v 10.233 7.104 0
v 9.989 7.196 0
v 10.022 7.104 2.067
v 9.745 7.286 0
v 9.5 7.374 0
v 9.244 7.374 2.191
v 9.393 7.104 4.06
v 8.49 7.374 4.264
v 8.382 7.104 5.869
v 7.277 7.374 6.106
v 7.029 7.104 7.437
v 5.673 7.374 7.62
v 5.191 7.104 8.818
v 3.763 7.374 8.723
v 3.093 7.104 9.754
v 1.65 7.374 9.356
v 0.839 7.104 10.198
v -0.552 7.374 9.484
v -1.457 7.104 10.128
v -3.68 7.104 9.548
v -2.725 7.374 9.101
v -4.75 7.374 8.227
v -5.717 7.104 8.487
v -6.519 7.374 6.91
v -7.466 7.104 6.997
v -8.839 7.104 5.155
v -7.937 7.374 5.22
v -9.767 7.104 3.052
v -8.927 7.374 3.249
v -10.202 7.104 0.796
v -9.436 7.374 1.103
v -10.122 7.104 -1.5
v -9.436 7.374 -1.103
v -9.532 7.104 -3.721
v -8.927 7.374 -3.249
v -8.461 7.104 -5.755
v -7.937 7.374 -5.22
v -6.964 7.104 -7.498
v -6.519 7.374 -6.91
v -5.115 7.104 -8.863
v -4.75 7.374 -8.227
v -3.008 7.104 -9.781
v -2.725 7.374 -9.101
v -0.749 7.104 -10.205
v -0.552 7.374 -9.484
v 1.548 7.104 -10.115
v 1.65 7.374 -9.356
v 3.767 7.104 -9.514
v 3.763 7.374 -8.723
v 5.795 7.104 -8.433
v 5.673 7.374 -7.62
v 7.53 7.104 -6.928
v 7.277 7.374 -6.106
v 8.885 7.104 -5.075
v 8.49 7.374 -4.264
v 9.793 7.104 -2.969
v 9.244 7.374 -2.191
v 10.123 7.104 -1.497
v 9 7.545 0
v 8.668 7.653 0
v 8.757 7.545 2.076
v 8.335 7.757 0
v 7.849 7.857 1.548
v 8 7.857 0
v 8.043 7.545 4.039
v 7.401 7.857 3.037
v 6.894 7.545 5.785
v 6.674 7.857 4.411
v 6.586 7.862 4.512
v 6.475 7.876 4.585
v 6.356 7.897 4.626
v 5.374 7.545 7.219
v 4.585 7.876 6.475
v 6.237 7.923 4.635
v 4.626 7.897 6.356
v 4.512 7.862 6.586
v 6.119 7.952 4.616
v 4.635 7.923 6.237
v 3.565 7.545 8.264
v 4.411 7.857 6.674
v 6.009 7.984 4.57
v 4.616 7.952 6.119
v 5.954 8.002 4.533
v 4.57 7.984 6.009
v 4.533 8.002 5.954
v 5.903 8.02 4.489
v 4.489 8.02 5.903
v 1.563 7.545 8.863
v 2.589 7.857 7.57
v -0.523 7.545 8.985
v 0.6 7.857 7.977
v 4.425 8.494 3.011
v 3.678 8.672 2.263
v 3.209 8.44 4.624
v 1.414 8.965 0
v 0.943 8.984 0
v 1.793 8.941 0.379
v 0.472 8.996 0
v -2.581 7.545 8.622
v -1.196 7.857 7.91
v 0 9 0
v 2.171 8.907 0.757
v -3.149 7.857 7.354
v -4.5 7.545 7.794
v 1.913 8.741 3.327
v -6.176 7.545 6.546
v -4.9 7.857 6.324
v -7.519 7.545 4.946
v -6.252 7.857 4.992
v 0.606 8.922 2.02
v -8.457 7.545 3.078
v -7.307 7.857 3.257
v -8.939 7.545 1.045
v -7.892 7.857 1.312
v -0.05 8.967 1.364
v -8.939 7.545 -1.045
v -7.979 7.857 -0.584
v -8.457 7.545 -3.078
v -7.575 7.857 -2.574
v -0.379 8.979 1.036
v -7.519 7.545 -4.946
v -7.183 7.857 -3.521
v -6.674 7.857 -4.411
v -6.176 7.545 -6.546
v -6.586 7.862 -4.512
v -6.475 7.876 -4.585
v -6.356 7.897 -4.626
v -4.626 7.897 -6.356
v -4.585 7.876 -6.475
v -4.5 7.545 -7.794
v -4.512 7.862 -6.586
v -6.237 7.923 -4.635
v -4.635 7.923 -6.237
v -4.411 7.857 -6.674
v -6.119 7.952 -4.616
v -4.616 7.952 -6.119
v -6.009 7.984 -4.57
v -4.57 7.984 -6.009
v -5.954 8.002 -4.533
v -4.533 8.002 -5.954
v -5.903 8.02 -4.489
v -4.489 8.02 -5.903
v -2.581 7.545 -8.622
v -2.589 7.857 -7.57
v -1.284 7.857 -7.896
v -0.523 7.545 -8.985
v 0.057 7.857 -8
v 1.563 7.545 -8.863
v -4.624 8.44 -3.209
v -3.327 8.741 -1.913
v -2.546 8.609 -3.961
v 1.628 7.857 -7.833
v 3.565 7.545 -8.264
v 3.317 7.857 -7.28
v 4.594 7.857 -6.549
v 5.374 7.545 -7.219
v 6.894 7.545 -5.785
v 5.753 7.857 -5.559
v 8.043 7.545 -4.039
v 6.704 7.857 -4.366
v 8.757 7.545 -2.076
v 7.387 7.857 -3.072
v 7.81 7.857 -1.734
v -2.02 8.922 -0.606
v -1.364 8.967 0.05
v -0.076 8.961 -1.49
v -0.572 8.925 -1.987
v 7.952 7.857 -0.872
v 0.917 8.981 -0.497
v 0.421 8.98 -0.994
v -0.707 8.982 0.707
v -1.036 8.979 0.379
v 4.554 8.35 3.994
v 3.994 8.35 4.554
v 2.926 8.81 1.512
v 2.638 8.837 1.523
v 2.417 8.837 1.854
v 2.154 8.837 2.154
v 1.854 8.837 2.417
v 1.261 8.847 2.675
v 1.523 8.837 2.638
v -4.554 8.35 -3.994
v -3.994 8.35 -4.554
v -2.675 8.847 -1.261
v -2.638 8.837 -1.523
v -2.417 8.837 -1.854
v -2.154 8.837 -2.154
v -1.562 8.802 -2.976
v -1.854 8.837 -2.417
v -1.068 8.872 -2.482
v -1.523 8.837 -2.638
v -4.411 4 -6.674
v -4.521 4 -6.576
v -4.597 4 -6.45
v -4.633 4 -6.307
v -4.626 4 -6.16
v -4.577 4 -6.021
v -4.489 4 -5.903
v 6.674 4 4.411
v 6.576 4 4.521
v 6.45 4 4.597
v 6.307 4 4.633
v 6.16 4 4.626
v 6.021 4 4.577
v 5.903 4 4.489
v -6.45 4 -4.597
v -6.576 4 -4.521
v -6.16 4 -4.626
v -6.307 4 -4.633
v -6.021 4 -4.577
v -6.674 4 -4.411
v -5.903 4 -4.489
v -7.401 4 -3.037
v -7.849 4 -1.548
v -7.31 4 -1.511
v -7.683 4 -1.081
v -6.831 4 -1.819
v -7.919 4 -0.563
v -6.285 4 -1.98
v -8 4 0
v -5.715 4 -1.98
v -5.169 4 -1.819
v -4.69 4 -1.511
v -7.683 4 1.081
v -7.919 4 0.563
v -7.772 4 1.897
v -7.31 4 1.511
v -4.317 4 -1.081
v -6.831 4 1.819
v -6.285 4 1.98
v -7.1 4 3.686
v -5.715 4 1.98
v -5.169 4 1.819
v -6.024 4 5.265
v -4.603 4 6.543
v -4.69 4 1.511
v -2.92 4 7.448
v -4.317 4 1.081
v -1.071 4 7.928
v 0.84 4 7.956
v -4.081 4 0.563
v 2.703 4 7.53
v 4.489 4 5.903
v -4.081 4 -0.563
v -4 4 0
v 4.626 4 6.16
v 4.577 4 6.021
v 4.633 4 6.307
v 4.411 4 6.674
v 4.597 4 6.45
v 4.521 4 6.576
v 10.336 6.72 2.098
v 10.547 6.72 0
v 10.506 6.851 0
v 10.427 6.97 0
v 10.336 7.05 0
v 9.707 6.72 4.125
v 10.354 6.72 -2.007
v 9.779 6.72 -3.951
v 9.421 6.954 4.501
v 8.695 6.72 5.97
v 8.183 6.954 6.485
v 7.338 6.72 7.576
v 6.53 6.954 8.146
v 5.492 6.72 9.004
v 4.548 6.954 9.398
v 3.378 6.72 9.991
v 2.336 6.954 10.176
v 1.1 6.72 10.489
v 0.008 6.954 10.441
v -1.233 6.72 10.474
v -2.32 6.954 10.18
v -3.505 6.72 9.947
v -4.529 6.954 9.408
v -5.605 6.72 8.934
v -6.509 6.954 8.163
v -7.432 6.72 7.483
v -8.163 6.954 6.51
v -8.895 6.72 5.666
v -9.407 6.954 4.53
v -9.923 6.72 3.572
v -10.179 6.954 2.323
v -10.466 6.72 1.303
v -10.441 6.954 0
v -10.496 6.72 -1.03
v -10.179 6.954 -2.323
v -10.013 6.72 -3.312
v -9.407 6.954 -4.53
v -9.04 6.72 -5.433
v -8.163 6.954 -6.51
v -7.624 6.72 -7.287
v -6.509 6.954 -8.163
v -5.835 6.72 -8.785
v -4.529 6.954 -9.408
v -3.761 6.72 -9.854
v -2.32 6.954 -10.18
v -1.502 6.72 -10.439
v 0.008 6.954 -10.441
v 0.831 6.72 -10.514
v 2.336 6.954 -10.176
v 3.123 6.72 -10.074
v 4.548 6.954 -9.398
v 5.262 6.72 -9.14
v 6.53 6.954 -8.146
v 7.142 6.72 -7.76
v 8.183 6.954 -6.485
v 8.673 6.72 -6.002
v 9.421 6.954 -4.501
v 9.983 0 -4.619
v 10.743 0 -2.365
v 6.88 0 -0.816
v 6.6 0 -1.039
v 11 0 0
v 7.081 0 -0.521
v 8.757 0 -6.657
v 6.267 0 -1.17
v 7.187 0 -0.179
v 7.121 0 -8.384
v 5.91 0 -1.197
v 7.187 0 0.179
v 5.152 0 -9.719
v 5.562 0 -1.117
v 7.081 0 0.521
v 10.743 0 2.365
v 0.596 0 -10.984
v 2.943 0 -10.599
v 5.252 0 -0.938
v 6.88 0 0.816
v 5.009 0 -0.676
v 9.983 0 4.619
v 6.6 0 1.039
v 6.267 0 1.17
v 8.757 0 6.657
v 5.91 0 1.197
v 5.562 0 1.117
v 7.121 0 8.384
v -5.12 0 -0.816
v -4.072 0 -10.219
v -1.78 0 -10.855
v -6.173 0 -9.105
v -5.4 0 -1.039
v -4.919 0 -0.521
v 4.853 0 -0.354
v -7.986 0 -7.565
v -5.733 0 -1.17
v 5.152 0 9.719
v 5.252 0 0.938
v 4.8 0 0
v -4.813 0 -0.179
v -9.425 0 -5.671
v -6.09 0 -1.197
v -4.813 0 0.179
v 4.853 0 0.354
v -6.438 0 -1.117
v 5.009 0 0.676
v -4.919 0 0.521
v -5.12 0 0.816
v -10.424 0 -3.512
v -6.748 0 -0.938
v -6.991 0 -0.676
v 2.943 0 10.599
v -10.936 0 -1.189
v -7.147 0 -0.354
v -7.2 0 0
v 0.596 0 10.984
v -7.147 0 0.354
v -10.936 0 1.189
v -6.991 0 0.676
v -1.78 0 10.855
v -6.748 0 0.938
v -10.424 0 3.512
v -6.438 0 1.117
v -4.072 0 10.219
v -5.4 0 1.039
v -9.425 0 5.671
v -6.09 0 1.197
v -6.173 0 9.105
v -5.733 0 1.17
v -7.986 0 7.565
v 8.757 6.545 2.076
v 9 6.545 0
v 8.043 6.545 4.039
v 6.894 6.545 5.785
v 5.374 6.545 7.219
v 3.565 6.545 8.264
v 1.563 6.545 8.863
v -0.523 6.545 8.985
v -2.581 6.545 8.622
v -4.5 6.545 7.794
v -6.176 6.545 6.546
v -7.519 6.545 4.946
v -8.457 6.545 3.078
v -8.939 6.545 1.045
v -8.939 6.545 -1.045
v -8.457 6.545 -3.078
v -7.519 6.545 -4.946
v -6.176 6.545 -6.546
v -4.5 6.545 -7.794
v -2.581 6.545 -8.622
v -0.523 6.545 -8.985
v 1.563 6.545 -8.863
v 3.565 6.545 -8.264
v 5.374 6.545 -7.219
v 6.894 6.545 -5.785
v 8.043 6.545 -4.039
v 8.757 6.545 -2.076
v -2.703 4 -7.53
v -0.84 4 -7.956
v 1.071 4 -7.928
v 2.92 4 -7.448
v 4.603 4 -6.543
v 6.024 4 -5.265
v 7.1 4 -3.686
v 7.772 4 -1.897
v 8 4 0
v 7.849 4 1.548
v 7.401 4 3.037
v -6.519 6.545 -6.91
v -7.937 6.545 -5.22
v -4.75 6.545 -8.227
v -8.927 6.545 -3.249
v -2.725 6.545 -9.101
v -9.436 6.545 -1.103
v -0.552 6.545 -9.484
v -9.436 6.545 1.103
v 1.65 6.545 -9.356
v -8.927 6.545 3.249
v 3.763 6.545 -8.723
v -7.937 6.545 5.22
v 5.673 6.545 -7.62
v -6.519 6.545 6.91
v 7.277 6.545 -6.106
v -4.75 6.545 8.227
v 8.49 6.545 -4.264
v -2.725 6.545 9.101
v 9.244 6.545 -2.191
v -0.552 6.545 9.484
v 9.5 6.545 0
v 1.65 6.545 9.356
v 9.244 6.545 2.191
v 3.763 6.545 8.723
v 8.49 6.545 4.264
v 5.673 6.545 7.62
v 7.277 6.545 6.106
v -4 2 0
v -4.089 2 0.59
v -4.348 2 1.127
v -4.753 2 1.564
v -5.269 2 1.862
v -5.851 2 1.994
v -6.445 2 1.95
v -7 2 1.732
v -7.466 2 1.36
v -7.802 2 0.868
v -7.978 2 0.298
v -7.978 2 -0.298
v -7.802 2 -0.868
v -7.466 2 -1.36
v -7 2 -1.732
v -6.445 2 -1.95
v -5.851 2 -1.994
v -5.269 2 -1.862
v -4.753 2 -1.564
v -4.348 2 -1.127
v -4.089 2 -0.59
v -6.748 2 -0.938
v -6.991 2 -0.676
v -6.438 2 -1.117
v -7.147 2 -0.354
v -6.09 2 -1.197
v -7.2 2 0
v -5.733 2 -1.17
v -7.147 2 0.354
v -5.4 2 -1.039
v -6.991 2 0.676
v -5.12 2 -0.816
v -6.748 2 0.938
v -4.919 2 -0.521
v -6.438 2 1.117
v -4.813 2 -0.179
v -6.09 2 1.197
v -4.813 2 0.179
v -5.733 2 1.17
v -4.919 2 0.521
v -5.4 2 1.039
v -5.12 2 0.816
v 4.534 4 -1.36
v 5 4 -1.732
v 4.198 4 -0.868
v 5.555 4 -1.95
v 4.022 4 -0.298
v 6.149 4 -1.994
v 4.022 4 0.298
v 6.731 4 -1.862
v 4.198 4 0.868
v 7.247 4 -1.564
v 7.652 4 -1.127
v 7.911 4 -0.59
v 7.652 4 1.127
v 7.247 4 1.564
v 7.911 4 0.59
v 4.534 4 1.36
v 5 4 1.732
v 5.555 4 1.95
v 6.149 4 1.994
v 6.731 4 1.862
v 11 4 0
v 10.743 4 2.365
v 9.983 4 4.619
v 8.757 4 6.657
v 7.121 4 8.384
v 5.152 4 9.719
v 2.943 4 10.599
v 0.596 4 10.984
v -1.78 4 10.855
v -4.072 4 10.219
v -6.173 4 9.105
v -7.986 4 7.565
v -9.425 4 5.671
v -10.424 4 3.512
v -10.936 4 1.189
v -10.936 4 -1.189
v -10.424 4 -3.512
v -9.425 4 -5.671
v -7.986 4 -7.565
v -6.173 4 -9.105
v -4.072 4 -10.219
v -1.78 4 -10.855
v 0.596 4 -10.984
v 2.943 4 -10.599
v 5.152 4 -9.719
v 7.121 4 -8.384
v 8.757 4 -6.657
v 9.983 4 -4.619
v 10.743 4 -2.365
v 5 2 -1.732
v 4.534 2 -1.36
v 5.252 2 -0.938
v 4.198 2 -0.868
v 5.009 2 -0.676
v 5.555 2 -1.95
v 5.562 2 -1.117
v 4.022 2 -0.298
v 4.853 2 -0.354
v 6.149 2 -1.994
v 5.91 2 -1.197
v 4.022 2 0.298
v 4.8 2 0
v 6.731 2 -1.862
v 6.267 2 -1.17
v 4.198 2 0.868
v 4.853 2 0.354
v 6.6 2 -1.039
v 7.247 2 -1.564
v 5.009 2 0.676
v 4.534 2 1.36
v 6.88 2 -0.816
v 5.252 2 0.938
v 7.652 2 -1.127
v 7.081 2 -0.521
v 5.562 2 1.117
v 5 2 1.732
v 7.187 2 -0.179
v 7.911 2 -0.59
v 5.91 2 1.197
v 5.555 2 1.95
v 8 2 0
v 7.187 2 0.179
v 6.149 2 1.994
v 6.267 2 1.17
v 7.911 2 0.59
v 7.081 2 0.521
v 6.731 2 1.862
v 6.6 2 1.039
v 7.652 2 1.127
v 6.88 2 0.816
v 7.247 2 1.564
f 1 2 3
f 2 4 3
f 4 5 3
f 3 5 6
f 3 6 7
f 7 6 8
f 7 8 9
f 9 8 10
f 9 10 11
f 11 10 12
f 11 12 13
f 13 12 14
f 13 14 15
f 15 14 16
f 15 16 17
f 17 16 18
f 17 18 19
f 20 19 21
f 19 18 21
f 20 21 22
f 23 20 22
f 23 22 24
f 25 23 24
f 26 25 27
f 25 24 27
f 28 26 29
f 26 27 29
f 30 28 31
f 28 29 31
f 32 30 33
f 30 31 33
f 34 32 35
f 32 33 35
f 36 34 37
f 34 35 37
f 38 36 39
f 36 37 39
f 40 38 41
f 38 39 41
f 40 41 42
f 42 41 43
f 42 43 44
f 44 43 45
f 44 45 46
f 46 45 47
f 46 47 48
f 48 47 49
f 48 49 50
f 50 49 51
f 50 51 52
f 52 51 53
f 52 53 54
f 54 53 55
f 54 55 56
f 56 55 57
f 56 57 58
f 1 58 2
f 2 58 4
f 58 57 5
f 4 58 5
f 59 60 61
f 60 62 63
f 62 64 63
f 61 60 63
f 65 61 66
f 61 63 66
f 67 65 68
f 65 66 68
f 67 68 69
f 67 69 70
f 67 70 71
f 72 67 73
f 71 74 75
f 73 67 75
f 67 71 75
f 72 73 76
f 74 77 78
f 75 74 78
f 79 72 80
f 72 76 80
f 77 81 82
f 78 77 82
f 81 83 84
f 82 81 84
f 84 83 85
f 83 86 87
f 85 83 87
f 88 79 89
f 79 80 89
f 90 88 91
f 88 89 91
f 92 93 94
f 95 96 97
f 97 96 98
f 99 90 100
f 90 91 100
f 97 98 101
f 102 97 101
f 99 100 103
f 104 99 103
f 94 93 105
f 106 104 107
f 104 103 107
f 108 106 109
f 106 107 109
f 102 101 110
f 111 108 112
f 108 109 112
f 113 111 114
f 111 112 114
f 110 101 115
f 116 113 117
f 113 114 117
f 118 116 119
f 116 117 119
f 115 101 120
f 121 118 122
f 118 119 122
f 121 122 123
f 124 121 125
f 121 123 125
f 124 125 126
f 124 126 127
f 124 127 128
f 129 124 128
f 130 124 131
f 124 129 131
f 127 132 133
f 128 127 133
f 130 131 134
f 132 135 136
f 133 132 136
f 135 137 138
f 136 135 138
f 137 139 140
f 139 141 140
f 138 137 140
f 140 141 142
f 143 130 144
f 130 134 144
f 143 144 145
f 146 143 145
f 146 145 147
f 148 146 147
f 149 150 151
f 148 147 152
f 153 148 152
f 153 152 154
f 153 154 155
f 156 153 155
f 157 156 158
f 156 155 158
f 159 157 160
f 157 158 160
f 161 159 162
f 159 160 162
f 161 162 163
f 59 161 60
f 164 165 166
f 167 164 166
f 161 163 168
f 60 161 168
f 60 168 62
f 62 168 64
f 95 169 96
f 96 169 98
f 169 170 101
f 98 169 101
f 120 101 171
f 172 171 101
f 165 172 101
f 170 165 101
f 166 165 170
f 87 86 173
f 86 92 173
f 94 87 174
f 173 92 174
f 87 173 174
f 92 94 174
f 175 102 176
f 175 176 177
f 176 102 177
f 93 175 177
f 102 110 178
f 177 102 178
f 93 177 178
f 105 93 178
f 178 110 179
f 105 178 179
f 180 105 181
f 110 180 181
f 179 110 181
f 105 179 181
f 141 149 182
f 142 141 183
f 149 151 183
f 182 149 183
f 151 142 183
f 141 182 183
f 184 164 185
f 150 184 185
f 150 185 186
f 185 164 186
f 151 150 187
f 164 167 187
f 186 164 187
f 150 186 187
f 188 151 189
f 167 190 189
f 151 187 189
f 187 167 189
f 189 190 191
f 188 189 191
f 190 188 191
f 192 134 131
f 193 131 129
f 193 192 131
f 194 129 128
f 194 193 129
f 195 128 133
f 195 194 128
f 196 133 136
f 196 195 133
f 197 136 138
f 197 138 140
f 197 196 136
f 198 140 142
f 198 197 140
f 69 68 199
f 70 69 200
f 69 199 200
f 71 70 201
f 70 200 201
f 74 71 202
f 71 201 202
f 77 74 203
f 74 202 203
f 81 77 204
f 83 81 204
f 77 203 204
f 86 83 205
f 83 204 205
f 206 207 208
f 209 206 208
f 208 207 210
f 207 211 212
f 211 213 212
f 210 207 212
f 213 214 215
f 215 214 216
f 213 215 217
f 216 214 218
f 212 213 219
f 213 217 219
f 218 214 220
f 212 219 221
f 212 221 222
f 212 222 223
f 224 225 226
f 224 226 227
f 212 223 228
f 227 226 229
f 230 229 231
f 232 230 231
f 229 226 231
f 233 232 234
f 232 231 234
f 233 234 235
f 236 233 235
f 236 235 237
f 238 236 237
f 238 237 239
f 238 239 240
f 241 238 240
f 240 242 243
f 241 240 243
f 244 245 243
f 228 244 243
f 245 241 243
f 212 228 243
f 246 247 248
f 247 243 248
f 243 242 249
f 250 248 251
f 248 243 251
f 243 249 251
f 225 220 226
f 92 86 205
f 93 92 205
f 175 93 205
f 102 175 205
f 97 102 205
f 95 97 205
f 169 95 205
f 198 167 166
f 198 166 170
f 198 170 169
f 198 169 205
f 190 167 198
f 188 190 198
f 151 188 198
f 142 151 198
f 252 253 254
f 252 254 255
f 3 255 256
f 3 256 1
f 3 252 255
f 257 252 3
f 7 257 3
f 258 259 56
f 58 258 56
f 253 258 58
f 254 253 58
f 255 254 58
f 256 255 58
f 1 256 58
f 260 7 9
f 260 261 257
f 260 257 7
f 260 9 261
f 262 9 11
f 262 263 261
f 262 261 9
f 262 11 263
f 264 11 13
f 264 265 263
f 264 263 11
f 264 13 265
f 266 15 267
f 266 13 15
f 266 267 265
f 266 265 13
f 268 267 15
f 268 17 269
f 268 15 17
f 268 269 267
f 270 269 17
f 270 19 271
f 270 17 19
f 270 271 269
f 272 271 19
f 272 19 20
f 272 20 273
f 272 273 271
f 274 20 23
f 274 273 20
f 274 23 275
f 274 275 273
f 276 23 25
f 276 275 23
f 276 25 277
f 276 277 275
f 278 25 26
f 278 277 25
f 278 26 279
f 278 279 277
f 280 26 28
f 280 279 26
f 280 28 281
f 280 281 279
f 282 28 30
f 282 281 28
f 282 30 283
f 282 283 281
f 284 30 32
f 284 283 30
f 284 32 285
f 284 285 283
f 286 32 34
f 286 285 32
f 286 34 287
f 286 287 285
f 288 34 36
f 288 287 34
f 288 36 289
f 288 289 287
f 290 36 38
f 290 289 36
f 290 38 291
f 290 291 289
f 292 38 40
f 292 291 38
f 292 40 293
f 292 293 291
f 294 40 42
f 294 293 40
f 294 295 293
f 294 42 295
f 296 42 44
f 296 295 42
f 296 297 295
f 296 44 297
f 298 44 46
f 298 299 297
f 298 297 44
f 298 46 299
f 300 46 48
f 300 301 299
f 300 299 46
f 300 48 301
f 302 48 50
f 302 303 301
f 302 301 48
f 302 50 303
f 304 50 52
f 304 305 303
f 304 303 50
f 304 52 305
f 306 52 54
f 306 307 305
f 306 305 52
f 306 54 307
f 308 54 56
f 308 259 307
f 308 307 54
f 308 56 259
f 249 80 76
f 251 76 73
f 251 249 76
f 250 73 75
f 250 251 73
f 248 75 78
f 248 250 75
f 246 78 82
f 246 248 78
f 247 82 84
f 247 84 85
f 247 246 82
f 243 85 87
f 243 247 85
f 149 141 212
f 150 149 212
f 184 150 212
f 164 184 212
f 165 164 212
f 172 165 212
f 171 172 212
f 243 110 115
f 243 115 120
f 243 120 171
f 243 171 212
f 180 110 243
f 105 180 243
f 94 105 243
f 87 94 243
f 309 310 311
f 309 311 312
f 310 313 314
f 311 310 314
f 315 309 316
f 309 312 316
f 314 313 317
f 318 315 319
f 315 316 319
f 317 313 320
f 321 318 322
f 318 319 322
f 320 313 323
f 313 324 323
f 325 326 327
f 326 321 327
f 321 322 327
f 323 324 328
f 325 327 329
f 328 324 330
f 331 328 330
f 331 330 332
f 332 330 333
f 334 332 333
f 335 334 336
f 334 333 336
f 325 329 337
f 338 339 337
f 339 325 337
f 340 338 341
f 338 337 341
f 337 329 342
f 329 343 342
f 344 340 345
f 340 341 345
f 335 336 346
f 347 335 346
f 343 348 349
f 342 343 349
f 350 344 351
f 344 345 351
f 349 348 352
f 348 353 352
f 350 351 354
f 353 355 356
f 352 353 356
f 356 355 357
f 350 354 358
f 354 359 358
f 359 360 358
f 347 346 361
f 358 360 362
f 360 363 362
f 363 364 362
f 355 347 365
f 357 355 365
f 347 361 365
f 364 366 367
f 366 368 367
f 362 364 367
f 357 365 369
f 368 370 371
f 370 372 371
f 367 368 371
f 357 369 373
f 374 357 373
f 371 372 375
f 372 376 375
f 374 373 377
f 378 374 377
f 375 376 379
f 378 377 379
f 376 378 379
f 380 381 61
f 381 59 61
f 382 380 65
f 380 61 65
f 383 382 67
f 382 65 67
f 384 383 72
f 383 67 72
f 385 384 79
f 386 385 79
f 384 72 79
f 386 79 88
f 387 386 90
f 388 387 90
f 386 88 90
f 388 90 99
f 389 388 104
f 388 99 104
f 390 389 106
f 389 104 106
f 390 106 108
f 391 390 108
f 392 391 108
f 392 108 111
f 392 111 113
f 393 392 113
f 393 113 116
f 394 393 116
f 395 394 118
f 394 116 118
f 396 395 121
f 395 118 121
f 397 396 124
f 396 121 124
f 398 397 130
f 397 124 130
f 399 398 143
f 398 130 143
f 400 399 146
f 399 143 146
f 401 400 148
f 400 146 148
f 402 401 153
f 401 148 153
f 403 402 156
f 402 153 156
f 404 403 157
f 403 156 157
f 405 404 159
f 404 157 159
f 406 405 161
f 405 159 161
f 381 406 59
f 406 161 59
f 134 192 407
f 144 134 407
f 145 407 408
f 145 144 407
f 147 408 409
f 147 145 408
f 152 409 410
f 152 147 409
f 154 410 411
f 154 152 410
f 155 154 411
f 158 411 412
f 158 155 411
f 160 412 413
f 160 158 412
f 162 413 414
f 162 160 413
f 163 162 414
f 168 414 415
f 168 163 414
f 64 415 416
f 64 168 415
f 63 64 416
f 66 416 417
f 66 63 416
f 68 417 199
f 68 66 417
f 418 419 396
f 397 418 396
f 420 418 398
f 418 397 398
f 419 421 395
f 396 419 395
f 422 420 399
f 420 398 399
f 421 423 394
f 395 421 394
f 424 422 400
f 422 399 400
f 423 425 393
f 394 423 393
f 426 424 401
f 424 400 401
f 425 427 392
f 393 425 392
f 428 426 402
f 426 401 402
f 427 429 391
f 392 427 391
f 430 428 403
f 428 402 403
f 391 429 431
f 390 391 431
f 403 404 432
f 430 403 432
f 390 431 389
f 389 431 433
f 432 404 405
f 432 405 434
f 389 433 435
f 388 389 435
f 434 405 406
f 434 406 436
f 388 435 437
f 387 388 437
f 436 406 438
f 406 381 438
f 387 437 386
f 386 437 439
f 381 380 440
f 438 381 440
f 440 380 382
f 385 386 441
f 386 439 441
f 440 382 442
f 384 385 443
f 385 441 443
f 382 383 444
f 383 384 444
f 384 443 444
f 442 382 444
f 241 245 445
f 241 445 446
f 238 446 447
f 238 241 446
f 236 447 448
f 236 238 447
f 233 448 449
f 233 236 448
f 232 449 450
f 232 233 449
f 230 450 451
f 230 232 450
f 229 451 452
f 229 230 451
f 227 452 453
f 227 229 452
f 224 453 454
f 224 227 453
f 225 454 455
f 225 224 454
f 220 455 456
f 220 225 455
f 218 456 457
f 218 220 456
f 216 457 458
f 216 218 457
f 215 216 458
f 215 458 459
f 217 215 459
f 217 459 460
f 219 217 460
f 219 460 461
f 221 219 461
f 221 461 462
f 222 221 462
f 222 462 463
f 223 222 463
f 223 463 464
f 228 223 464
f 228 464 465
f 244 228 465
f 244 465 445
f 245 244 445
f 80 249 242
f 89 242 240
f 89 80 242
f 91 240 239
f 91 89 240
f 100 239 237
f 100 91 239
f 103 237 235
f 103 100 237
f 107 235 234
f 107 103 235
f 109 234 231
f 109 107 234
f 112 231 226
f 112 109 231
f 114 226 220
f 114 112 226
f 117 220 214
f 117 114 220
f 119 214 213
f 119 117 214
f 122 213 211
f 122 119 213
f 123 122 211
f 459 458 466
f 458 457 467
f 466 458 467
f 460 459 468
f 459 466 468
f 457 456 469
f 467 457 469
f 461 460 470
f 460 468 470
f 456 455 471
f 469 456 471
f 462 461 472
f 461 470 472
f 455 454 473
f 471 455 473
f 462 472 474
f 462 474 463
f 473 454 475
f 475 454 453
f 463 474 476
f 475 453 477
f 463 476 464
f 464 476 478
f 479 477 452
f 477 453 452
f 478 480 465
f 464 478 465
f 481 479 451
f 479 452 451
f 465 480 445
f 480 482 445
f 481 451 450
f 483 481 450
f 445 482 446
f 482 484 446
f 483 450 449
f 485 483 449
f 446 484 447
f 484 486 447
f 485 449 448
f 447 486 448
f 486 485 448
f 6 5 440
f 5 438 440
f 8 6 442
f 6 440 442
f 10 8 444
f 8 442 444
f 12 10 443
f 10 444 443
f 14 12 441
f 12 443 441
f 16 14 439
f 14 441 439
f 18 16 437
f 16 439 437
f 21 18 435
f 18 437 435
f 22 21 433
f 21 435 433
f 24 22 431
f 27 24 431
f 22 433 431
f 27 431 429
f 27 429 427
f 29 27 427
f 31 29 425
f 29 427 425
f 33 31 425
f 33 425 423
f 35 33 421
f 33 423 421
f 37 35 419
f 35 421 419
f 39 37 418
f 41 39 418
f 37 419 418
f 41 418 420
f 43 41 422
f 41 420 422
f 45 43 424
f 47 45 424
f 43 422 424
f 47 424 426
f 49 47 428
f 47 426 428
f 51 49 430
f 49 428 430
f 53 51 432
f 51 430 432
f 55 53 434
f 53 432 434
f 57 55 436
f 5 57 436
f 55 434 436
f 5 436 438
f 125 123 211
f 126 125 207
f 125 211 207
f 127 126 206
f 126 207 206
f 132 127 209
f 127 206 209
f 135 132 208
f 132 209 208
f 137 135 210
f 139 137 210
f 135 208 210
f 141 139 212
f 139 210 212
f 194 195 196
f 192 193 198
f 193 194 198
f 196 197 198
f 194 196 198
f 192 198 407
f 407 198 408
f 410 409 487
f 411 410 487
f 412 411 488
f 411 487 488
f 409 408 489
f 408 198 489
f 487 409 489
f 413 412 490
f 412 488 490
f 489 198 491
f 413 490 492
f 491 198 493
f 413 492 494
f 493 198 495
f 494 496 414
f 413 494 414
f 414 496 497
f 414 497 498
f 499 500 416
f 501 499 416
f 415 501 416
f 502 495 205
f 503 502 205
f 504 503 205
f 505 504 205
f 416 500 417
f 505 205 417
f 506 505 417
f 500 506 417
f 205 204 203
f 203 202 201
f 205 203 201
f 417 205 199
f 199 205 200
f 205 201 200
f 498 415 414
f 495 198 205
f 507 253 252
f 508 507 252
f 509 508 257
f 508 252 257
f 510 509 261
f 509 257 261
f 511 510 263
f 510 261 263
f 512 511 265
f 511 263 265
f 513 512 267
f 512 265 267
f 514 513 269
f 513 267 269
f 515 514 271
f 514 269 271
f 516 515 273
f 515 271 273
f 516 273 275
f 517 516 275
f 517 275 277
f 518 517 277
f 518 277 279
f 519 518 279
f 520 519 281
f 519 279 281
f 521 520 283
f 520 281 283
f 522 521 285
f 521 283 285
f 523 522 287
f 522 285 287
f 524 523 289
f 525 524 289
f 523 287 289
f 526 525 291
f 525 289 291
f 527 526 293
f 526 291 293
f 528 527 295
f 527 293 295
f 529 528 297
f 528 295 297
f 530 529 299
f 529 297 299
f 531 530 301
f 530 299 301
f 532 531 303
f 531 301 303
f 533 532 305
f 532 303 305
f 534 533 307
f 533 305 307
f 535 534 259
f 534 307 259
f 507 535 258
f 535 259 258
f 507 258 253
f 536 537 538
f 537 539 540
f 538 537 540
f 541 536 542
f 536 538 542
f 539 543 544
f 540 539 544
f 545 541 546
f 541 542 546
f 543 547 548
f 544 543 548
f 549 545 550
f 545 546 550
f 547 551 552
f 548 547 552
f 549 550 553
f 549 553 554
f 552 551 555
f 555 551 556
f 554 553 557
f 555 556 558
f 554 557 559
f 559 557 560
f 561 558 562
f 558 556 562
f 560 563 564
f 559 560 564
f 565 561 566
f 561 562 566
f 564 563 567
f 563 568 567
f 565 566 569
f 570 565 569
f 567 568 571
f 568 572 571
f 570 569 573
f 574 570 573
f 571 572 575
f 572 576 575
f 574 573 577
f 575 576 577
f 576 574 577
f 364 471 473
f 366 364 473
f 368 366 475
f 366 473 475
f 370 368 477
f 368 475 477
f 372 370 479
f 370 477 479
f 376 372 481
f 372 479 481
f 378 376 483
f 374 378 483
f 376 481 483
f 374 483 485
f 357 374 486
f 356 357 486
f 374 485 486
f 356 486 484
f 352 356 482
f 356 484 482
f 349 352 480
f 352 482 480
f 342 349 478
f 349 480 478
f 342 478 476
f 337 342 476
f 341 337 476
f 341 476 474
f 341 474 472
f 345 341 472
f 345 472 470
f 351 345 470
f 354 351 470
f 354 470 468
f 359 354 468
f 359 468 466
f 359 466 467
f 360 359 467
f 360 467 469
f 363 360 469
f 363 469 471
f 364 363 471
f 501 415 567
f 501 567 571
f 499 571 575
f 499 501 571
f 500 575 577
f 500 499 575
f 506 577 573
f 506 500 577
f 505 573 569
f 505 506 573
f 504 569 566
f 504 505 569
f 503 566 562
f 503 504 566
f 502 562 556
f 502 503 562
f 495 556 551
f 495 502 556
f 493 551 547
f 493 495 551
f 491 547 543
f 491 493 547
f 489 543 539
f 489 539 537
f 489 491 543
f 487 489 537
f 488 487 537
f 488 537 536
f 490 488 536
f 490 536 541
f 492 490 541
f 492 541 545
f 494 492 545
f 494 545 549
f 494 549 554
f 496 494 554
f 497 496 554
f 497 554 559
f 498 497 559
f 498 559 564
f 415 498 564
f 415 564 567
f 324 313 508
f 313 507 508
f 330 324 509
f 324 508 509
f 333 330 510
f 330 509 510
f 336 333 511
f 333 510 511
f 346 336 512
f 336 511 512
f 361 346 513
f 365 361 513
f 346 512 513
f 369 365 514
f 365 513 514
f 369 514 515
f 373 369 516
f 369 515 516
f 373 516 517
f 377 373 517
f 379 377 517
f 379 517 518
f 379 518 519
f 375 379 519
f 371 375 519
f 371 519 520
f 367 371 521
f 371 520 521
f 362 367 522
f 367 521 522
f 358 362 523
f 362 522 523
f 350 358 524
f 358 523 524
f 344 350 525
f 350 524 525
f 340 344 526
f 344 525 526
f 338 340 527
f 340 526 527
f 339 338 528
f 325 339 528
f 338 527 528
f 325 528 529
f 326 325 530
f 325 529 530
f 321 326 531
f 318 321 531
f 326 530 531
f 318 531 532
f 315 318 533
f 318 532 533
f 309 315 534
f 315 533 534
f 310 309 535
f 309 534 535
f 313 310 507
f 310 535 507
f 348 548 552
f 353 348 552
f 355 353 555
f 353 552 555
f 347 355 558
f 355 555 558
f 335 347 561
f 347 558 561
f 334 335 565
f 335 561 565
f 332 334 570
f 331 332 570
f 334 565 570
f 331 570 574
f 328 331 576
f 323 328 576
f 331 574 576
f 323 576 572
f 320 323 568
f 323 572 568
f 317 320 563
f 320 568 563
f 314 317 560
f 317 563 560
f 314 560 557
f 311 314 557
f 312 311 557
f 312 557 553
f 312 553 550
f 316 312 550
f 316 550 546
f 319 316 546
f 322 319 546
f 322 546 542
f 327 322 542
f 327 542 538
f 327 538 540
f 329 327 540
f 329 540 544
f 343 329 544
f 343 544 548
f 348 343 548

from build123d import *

# Parameters (mm, degrees)
F2_R      = 0.5
F5_DEPTH  = 5
F6_R      = 0.5
F7_R      = 2
F8_DEPTH  = 7
F9_R      = 1.2
F10_DEPTH = 25


with BuildPart() as f1:
    # F0 (on Top) → F1 (revolve)
    with BuildSketch(Plane.XY):
        with BuildLine():
            Line((0, 9), (0, 0))
            Line((0, 0), (11, 0))
            Line((11, 0), (11, 4))
            Line((11, 4), (10.5, 7))
            ThreePointArc((10.5, 7), (10.0017468007, 7.1915925315), (9.5, 7.3738398822))
            Line((9.5, 7.3738398822), (9.5, 6.5449972332))
            Line((9.5, 6.5449972332), (9, 6.5449972332))
            Line((9, 6.5449972332), (9, 7.5449972332))
            ThreePointArc((9, 7.5449972332), (4.5584271698, 8.6339031037), (0, 9))
        make_face()
    revolve(axis=Axis((0, 4.5, 0), (0, -1, 0)))

    # F2
    f2_edges = [f1.edges().sort_by_distance(p)[0] for p in [
        (-10.5, 7, 0),
    ]]
    fillet(f2_edges, radius=F2_R)

    # F4 (on offset) → F5 (cut)
    with BuildSketch(Plane.XZ.offset(-9)):
        with BuildLine():
            ThreePointArc((-4.905379299, -6.3195928613), (5.6568542495, -5.6568542495), (6.3195928613, 4.905379299))
            Line((6.3195928613, 4.905379299), (-4.905379299, -6.3195928613))
        make_face()
        with BuildLine():
            Line((-6.3195928613, -4.905379299), (4.905379299, 6.3195928613))
            ThreePointArc((4.905379299, 6.3195928613), (-5.6568542495, 5.6568542495), (-6.3195928613, -4.905379299))
        make_face()
    extrude(amount=F5_DEPTH, mode=Mode.SUBTRACT)

    # F6
    f6_edges = [f1.edges().sort_by_distance(p)[0] for p in [
        (6.319593, 5.928385, 4.905379),
        (-4.905379, 5.928385, -6.319593),
        (-6.319593, 5.928385, -4.905379),
        (4.905379, 5.928385, 6.319593),
    ]]
    fillet(f6_edges, radius=F6_R)

    # F7 (on offset) → F8 (cut)
    with BuildSketch(Plane.XZ.offset(-9)):
        with Locations((6, 0)):
            Circle(F7_R)
        with Locations((-6, 0)):
            Circle(F7_R)
    extrude(amount=F8_DEPTH, mode=Mode.SUBTRACT)

    # F9 (on face) → F10 (cut)
    with BuildSketch(Plane(origin=(0, 2, 0), x_dir=(-1, 0, 0), z_dir=(0, 1, 0))):
        with Locations((-6, 0)):
            Circle(F9_R)
        with Locations((6, 0)):
            Circle(F9_R)
    extrude(amount=-F10_DEPTH, mode=Mode.SUBTRACT)


solid = f1.part
